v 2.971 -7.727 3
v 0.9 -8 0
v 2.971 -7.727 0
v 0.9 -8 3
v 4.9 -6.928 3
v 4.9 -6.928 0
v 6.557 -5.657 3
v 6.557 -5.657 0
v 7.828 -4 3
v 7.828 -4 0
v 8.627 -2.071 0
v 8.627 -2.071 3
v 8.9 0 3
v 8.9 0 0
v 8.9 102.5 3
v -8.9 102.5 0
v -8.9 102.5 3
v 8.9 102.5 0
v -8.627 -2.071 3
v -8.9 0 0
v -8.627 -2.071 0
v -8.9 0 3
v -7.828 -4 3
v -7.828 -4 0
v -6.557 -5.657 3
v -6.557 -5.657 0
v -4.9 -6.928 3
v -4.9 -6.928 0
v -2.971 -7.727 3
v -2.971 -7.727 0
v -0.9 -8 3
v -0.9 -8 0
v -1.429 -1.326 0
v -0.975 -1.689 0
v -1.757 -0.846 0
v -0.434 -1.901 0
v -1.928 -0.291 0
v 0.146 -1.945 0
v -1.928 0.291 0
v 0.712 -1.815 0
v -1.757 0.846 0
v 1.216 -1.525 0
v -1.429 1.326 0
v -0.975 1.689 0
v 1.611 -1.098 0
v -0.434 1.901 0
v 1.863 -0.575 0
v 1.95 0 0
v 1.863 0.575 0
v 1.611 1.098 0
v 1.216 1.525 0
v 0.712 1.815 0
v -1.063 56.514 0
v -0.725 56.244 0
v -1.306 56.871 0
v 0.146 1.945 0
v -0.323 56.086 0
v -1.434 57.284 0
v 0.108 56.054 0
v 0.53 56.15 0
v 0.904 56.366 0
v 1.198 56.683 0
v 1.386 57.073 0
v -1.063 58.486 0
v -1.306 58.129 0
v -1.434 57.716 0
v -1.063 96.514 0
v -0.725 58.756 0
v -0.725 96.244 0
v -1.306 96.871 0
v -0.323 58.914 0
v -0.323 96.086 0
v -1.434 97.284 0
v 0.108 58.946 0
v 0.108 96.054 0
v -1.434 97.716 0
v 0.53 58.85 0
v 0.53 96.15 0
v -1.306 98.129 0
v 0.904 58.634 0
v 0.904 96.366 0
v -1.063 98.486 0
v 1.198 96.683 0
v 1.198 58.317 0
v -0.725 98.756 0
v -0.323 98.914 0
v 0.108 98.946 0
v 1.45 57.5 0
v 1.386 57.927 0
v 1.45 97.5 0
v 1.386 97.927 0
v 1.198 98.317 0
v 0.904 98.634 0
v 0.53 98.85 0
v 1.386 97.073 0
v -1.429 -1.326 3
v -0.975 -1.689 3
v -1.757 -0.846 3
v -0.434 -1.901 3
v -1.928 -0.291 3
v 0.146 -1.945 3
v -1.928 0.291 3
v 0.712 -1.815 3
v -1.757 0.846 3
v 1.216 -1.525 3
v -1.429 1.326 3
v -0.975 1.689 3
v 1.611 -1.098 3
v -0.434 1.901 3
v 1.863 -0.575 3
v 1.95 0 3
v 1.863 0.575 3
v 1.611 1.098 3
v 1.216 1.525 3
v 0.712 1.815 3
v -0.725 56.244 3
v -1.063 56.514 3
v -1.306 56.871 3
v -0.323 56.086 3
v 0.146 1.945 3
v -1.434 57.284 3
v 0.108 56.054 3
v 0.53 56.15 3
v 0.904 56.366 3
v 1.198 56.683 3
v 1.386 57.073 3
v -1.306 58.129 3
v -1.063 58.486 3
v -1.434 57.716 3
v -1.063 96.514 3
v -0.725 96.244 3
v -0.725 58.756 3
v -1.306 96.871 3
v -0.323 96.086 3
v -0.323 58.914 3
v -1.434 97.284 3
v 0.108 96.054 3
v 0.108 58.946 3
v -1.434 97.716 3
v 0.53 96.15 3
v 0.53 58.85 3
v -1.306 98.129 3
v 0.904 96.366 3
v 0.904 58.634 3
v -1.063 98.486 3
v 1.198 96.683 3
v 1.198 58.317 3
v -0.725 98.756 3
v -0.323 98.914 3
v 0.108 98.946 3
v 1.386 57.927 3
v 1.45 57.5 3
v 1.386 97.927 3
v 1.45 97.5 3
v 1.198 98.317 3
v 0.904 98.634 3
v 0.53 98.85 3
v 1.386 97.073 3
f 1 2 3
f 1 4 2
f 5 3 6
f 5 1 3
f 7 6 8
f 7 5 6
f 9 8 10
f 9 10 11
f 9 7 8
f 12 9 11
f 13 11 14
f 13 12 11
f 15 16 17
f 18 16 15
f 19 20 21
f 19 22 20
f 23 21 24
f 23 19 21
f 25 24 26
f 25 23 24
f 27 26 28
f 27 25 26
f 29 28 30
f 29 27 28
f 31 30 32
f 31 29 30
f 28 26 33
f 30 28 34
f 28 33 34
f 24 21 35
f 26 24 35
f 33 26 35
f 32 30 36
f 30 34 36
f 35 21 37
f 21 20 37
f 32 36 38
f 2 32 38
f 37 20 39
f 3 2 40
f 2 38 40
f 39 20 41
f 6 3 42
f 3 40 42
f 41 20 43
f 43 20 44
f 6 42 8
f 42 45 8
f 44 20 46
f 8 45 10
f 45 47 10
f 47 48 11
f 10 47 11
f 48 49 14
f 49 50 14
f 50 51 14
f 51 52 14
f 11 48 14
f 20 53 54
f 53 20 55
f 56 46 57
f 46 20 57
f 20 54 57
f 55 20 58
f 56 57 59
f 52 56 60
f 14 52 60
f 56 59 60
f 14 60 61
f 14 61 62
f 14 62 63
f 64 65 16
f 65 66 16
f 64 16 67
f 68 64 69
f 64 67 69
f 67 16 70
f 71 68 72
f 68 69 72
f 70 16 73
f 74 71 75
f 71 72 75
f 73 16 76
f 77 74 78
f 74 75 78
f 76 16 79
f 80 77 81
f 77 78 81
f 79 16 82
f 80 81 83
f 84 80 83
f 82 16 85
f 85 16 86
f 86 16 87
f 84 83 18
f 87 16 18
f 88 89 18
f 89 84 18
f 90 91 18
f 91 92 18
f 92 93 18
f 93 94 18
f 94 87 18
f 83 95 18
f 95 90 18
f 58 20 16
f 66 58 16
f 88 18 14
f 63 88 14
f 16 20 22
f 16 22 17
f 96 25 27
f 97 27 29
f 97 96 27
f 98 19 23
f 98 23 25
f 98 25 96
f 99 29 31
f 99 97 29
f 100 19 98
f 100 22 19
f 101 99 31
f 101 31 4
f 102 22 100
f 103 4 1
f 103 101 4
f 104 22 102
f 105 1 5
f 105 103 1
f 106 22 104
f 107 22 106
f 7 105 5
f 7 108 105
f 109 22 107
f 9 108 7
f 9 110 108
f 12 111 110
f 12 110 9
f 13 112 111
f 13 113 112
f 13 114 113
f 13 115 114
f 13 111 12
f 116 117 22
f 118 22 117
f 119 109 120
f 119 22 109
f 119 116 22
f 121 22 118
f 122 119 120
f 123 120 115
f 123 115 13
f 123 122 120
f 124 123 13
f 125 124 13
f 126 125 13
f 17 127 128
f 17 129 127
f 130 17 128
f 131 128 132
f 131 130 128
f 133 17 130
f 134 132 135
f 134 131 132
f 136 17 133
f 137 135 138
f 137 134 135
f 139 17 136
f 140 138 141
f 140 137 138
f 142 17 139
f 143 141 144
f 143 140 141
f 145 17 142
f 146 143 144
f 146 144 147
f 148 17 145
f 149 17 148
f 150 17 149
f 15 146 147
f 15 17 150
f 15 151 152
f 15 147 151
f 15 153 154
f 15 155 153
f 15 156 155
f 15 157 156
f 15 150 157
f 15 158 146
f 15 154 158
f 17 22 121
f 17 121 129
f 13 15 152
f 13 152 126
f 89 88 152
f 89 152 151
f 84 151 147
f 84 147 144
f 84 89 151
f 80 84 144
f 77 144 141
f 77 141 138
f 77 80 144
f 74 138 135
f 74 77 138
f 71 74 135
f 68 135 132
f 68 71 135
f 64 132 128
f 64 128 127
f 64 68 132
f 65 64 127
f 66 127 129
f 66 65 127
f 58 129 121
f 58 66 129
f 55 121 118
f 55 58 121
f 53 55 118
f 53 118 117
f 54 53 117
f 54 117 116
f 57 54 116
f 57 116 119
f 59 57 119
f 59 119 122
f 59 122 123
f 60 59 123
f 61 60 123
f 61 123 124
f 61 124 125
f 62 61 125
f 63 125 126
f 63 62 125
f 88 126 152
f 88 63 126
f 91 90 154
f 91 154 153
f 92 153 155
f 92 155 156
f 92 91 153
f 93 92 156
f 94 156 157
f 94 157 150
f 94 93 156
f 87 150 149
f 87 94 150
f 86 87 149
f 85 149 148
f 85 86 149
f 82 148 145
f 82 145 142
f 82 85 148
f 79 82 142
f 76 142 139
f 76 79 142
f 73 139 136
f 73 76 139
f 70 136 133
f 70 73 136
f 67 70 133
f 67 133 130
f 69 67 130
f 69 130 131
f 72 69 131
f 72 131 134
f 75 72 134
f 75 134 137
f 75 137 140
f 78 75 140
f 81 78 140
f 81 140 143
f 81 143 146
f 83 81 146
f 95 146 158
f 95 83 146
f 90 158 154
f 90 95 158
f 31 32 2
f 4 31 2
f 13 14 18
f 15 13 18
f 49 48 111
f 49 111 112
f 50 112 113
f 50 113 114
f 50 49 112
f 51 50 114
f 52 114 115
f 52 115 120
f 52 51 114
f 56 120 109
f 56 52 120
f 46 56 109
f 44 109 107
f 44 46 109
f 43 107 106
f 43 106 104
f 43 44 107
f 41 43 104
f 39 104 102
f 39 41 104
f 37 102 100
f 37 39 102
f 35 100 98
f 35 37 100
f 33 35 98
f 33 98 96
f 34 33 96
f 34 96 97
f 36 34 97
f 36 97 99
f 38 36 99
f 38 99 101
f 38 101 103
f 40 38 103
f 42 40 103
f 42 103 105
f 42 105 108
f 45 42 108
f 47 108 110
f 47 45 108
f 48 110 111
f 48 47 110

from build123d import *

# Parameters (mm, degrees)
SKETCH_1_W      = 17.8
SKETCH_1_H      = 110.5
SKETCH_1_R      = 1.95
SKETCH_1_R_2    = 1.45
EXTRUDE_1_DEPTH = 3
FILLET_1_R      = 8


with BuildPart() as part:
    # 草图1 → 凸台-拉伸1 (new body)
    with BuildSketch(Plane.XY):
        with Locations((0, 47.25)):
            Rectangle(SKETCH_1_W, SKETCH_1_H)
        Circle(SKETCH_1_R, mode=Mode.SUBTRACT)
        with Locations((0, 57.5)):
            Circle(SKETCH_1_R_2, mode=Mode.SUBTRACT)
        with Locations((0, 97.5)):
            Circle(SKETCH_1_R_2, mode=Mode.SUBTRACT)
    extrude(amount=EXTRUDE_1_DEPTH)

    # 圆角1
    fillet_1_edges = [part.edges().sort_by_distance(p)[0] for p in [
        (8.9, -8, 1.5),
        (-8.9, -8, 1.5),
    ]]
    fillet(fillet_1_edges, radius=FILLET_1_R)


solid = part.part
